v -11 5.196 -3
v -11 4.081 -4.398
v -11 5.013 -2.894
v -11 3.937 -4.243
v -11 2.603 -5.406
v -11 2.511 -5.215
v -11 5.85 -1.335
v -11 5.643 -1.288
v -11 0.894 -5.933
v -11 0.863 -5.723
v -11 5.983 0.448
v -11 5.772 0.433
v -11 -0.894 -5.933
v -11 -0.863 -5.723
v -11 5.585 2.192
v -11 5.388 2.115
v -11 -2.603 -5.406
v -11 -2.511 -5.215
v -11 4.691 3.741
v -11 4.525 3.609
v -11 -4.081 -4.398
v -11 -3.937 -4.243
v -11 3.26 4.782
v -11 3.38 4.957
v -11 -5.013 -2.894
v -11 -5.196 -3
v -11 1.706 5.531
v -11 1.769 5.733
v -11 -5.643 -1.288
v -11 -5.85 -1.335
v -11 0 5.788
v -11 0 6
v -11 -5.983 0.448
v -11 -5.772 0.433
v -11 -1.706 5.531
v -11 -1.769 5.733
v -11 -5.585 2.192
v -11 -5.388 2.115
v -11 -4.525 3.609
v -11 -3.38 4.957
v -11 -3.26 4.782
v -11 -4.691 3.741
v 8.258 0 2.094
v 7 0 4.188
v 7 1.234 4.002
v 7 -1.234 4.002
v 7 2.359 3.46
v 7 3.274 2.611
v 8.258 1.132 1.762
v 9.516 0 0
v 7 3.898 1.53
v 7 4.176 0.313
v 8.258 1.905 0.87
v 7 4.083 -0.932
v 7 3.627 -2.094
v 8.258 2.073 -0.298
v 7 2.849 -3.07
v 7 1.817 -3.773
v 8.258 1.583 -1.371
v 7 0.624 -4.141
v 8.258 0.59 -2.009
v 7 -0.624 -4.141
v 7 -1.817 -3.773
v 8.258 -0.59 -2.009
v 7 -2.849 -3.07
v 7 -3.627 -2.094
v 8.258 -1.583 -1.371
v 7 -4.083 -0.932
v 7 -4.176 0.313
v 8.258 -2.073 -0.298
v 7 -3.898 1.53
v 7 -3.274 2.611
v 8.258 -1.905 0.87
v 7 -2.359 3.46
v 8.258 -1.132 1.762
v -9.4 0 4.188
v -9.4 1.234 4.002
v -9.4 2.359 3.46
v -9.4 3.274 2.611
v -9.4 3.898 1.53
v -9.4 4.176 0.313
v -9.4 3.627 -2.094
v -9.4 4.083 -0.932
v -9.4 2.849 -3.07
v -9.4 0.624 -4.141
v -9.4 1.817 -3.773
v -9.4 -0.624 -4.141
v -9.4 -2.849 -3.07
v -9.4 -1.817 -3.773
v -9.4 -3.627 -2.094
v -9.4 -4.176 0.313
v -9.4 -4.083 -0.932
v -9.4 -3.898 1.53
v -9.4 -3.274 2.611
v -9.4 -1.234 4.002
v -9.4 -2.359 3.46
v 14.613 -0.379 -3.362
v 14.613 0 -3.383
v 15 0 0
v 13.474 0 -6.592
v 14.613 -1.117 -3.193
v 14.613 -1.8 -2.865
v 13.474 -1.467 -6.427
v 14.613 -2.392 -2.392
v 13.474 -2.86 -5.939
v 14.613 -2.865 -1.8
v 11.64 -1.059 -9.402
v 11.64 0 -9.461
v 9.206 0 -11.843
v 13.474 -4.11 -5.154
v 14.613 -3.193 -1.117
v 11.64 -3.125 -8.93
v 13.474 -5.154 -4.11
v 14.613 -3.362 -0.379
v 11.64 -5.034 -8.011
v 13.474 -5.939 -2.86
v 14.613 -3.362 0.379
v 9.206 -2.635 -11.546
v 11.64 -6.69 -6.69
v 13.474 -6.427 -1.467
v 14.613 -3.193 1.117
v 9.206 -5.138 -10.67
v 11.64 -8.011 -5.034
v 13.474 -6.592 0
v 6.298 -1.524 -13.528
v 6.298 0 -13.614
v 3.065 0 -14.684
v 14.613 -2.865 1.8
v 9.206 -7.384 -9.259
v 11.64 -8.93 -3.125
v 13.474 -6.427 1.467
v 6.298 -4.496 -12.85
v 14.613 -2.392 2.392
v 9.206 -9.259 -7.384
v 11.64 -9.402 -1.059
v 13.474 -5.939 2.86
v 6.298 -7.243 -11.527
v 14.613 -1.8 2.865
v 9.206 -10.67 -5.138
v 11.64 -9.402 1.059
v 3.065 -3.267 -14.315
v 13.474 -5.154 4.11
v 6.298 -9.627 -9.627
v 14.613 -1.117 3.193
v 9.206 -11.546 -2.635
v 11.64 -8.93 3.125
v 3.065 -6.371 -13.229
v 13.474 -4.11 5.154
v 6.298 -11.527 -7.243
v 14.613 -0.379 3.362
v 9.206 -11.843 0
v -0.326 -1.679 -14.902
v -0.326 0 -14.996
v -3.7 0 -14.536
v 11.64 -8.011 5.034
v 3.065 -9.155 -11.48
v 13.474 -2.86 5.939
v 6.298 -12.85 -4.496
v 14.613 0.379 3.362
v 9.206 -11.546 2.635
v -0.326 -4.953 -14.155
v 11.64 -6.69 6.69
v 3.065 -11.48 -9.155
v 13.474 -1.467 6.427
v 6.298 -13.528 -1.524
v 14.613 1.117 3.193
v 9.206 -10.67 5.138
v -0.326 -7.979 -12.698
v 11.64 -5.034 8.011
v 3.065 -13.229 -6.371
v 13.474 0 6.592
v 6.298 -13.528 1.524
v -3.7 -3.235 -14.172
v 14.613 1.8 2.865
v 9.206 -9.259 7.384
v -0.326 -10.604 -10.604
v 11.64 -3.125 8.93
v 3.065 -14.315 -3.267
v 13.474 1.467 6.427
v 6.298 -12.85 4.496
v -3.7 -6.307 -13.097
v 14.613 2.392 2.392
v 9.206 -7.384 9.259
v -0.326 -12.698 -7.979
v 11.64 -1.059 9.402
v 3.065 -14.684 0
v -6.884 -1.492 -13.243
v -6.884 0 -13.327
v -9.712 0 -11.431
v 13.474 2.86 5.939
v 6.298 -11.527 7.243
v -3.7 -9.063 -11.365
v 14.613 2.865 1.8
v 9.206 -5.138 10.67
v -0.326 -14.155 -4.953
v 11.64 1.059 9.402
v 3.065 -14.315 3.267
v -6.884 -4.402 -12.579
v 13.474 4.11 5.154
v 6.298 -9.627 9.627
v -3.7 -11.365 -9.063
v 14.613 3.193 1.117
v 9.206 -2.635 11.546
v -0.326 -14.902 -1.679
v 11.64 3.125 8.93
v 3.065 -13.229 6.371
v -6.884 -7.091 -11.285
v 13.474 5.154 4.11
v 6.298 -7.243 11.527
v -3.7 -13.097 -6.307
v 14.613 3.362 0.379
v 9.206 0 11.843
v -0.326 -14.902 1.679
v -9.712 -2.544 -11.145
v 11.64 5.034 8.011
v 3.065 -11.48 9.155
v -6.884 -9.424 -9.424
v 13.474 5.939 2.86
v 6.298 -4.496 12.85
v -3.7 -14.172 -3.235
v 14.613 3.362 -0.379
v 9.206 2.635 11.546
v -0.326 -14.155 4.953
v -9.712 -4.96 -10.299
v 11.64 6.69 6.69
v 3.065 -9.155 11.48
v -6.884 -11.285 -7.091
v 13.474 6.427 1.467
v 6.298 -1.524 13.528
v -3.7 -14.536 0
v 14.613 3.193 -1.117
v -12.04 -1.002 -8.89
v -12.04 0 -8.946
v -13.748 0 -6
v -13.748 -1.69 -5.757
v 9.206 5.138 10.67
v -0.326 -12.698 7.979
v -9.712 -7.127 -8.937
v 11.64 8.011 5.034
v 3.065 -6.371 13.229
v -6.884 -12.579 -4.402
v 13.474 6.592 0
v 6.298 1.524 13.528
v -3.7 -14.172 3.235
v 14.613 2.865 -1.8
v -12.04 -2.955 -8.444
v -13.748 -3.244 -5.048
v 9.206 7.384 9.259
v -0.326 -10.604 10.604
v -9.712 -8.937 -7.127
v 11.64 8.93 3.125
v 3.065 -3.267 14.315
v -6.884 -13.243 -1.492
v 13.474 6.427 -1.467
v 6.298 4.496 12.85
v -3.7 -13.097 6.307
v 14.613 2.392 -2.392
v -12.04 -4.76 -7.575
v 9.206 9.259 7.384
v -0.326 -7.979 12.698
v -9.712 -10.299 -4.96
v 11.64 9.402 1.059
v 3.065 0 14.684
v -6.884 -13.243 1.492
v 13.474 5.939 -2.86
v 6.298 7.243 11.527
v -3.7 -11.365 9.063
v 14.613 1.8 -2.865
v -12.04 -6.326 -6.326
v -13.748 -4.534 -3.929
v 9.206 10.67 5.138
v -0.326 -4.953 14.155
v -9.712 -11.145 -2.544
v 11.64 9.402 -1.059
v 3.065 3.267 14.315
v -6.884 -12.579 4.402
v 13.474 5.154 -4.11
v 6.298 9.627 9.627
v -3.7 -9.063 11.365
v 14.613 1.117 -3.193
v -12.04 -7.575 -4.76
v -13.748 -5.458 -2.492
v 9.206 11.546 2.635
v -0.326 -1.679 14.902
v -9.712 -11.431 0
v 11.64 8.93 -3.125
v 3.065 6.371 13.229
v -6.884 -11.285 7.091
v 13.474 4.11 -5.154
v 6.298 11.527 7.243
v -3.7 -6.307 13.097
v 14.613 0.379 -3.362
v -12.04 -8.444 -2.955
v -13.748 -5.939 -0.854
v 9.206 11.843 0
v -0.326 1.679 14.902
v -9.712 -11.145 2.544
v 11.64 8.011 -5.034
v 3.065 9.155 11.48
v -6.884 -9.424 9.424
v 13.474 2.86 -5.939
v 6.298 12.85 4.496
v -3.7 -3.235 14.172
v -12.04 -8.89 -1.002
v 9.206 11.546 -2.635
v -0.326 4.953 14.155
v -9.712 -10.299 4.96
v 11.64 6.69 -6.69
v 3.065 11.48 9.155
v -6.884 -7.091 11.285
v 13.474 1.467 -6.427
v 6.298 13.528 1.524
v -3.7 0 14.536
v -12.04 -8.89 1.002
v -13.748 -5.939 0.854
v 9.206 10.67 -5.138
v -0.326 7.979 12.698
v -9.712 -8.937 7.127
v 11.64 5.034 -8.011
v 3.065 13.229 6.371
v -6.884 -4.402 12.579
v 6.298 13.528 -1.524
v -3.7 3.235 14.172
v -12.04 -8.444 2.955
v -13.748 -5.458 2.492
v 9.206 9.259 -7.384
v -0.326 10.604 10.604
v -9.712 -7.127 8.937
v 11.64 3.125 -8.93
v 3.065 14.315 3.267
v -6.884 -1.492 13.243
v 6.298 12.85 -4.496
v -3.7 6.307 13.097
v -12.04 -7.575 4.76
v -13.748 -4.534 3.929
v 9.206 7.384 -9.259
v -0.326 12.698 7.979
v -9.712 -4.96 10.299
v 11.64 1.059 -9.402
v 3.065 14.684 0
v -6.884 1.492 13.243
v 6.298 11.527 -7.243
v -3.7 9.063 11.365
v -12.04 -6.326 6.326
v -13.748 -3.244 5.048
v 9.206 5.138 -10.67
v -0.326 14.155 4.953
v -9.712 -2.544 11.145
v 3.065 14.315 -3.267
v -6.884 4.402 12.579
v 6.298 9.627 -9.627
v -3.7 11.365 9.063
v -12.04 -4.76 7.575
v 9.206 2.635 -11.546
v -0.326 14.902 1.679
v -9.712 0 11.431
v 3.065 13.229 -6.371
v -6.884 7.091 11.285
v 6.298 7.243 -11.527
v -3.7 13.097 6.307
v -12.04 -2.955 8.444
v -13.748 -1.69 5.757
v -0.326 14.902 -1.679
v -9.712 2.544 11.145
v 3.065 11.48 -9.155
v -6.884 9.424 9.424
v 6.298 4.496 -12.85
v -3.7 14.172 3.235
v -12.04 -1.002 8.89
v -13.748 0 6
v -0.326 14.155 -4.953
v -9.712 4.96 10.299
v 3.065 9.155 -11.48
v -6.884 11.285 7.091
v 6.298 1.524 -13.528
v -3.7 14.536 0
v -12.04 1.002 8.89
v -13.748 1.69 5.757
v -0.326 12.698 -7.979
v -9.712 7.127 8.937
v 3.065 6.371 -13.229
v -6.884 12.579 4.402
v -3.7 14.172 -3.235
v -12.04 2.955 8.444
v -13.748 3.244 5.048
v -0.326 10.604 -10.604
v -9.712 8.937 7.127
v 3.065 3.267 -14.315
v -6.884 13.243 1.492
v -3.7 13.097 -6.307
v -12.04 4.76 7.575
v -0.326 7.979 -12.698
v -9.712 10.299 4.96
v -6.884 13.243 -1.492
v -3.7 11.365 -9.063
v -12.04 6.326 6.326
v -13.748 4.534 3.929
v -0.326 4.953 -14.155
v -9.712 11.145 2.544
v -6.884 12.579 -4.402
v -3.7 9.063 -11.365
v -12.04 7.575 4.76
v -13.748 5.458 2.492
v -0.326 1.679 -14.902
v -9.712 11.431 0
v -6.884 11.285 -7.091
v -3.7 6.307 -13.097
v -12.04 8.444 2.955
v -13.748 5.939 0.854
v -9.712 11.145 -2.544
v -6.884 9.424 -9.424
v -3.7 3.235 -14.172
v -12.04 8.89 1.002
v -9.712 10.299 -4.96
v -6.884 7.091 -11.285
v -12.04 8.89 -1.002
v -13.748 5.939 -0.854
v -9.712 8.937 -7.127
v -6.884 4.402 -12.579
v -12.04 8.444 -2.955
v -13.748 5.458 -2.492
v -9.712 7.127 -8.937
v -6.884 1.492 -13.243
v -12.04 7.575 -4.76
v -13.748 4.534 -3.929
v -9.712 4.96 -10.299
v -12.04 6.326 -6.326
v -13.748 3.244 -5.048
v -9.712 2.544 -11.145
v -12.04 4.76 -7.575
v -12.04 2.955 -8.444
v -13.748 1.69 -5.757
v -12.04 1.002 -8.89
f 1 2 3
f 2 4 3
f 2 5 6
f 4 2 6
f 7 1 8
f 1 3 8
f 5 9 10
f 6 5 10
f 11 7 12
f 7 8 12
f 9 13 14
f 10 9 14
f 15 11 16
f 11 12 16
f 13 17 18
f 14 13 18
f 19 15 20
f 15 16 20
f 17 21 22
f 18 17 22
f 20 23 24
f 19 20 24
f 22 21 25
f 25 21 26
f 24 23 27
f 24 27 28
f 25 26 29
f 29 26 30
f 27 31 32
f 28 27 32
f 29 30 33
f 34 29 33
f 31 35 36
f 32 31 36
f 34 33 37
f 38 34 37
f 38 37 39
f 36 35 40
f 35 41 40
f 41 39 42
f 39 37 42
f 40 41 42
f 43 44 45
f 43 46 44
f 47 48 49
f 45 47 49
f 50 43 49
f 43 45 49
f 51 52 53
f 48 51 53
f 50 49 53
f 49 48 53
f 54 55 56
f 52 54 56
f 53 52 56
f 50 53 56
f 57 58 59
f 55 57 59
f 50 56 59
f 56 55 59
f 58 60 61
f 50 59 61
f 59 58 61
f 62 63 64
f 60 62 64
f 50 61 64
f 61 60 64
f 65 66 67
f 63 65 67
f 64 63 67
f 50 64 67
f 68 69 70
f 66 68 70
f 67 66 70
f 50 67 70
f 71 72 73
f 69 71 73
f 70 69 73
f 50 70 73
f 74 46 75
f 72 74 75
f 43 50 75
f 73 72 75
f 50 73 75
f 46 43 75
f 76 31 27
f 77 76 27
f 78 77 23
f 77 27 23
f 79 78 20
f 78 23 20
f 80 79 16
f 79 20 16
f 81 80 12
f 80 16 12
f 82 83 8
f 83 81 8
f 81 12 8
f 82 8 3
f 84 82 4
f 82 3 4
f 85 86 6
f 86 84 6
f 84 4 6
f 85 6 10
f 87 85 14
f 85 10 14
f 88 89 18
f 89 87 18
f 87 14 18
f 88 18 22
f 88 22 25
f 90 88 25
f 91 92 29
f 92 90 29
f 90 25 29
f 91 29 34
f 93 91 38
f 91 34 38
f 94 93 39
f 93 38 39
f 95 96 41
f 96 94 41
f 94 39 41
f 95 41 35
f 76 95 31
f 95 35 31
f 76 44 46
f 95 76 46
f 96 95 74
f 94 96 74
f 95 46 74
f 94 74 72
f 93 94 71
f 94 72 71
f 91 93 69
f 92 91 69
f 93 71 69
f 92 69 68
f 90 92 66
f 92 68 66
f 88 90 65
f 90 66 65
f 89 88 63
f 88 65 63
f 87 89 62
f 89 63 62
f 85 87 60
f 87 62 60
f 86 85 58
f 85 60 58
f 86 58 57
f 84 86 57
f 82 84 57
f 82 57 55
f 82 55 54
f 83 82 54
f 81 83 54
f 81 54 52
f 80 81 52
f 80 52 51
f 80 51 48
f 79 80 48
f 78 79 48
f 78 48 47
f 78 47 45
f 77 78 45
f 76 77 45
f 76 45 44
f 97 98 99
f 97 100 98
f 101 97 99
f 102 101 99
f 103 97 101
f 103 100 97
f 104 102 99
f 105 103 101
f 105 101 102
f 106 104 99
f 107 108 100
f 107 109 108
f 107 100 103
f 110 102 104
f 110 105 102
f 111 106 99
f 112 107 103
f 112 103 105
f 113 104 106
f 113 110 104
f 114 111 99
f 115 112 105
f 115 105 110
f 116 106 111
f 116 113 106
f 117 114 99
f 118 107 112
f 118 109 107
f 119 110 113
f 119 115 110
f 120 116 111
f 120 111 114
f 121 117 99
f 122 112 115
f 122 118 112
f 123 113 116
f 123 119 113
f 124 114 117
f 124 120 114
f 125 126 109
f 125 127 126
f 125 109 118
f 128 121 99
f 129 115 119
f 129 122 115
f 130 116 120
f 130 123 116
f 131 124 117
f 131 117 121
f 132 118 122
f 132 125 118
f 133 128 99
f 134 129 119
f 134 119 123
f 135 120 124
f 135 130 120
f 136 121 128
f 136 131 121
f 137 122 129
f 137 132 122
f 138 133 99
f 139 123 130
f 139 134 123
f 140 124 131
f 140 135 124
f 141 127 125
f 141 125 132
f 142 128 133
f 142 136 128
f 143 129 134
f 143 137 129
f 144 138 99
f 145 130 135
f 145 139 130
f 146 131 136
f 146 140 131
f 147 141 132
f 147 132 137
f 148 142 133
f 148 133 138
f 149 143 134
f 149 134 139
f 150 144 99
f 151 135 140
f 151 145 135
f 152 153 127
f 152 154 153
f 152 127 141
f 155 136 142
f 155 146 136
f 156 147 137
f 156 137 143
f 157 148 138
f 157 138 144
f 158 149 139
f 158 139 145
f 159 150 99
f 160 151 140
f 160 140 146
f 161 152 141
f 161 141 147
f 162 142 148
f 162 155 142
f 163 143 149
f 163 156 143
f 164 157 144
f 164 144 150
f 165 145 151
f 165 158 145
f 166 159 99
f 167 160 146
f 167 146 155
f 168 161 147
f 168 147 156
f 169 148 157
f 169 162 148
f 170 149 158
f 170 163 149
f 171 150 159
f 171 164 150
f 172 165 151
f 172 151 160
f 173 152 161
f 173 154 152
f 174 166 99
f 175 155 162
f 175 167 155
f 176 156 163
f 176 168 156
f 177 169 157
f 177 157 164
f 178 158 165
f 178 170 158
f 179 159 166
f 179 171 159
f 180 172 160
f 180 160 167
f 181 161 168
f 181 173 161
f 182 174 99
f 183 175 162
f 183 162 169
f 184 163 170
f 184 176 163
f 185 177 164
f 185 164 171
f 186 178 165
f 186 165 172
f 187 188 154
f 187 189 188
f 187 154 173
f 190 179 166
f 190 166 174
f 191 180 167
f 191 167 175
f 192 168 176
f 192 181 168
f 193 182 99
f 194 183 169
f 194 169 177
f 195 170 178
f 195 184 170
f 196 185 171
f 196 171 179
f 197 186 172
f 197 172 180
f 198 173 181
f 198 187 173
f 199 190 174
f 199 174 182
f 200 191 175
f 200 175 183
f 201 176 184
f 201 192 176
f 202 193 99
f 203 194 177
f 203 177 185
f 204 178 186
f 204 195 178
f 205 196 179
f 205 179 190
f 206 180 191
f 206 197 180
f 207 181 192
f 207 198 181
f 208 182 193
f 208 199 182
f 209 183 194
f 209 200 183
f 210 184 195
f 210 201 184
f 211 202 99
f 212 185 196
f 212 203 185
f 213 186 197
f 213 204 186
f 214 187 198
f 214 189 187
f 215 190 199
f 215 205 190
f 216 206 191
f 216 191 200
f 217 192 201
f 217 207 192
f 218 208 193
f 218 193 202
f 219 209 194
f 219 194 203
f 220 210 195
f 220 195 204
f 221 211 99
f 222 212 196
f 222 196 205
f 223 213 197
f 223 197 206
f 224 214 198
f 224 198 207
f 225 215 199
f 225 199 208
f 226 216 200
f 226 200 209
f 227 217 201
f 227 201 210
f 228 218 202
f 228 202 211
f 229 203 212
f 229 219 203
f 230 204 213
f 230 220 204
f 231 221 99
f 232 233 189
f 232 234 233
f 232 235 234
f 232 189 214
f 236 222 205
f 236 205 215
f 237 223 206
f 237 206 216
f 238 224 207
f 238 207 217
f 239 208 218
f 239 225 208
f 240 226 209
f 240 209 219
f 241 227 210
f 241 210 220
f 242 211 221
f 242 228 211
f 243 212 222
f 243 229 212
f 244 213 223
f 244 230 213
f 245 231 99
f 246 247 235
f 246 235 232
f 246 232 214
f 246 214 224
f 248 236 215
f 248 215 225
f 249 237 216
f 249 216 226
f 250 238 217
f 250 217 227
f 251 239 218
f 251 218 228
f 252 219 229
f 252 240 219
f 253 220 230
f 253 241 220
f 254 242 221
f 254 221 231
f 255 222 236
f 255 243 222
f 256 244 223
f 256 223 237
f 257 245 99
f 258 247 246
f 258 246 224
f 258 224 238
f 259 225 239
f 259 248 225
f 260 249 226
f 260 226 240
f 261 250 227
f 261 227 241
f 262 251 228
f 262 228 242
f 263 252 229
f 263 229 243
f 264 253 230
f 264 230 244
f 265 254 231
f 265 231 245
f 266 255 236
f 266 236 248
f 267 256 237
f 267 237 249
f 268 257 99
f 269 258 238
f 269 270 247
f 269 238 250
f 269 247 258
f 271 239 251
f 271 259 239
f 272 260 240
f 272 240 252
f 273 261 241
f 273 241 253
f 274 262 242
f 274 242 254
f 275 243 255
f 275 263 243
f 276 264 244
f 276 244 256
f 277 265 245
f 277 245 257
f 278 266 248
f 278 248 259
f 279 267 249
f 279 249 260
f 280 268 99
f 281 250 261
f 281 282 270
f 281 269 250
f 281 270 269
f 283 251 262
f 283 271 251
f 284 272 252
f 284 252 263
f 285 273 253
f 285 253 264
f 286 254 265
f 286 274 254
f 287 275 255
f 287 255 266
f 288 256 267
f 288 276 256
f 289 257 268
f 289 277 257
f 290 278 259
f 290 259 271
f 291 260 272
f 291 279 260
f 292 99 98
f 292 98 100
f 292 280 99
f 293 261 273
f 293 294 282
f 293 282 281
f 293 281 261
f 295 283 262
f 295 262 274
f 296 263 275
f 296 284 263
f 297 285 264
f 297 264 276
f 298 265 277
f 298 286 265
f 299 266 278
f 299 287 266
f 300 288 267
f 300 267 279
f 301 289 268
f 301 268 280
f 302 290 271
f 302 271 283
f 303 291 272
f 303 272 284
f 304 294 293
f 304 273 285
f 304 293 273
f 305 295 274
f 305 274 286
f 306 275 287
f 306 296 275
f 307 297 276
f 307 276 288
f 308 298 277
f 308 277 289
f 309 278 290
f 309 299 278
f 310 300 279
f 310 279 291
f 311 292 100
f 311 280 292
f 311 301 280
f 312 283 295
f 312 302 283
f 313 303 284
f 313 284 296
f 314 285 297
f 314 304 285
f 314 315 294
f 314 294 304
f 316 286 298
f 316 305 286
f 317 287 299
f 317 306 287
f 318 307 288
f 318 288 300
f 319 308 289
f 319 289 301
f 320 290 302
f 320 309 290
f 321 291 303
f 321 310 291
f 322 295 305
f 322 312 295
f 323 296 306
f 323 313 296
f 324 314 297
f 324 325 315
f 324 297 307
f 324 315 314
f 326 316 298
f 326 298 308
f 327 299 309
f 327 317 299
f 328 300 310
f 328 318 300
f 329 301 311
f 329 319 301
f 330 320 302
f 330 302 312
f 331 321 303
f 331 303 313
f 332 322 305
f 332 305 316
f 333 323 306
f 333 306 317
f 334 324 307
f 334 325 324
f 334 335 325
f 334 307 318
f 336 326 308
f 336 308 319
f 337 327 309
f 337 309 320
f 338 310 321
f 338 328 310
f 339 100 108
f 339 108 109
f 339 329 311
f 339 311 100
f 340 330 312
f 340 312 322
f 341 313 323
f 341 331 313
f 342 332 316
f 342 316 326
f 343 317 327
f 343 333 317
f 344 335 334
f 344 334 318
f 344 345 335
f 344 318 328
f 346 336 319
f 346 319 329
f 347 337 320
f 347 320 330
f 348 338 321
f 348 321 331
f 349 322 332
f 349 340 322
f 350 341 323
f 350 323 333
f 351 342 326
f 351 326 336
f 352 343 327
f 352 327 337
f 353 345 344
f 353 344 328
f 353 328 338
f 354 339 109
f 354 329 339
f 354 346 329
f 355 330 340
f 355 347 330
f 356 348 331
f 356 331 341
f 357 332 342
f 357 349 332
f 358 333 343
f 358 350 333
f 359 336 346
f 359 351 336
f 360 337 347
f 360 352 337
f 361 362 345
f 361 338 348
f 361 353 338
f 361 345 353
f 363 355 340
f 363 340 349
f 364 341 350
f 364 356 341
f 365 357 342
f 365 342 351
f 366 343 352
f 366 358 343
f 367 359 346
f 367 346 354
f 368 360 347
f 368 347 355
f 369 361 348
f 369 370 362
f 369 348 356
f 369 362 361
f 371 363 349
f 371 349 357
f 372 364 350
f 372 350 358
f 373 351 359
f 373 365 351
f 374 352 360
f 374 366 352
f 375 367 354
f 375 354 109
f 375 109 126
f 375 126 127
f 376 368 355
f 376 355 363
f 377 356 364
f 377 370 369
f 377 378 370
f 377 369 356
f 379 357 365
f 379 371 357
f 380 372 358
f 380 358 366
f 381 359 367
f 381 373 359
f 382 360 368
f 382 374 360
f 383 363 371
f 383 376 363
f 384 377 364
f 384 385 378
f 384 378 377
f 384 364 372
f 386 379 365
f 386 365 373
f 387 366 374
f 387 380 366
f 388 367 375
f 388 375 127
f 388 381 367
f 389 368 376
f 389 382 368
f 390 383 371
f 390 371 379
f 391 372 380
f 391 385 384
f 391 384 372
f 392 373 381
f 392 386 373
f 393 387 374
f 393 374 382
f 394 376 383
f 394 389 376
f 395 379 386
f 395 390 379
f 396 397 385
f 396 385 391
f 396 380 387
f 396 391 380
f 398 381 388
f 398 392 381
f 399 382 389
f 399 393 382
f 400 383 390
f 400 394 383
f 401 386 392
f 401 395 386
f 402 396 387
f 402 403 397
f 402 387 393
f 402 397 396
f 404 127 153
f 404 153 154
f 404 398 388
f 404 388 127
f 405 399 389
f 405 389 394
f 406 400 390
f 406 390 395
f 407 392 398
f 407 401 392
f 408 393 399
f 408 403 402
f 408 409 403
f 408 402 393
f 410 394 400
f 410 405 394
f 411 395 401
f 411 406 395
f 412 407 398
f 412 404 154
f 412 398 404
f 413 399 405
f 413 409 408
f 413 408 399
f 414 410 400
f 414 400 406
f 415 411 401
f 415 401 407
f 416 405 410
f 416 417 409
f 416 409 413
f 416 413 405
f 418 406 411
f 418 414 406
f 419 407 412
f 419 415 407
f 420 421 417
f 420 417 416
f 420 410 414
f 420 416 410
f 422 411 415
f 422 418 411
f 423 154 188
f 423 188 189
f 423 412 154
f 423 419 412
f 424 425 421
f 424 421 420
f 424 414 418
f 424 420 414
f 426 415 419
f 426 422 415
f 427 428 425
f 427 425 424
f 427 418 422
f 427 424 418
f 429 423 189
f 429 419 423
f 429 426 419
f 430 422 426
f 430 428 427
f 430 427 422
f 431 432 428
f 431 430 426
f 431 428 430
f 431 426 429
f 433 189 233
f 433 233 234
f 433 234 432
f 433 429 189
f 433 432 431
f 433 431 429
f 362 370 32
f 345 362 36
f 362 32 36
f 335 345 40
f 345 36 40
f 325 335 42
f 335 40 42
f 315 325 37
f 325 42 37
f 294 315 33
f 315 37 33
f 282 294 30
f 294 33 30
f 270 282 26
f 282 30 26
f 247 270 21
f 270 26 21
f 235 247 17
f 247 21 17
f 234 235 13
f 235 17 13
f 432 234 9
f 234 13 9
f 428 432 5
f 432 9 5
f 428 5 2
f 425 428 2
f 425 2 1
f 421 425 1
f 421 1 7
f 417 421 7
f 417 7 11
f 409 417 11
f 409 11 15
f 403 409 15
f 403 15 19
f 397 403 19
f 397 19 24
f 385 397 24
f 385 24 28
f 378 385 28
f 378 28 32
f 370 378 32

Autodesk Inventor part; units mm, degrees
ref_plane "XZ Plane" through (0, 0, 0) normal (0, 1, 0) x (-1, 0, 0)
ref_plane "XY Plane" through (0, 0, 0) normal (0, 0, 1) x (1, 0, 0)
sketch "Эскиз1" plane through (0, 0, 0) normal (0, 1, 0) x (-1, 0, 0)
  arc A0 (-15, 0) -> (15, 0) centre (0, 0) ccw
  line L0 (15, 0) -> (-15, 0)
  dimension "d0" = 30
revolve "Вращение1" add sketch "Эскиз1" angle 360 about axis through (-15, 0, 0) along (1, 0, 0)
ref_plane "РабПлоскость1" through (-15, 0, 0) normal (1, 0, 0) x (0, 1, 0)
sketch "Эскиз2" plane through (-15, 0, 0) normal (1, 0, 0) x (0, 1, 0)
  point P0 (0, 0)
  point P1 (0, 0)
hole "Отверстие1" at (-15, 0, 0) direction (1, 0, 0) diameter 8.376 depth 22 tip angle 118 counterbore diameter 12 counterbore depth 4 thread size "M10x1.5" class "6H" standard "ISO Metric profile"
chamfer "Фаска1" distance 1.6 angle 45 1 edges at (-11, 0, -4.188)
properties part number "Ручка-09"
